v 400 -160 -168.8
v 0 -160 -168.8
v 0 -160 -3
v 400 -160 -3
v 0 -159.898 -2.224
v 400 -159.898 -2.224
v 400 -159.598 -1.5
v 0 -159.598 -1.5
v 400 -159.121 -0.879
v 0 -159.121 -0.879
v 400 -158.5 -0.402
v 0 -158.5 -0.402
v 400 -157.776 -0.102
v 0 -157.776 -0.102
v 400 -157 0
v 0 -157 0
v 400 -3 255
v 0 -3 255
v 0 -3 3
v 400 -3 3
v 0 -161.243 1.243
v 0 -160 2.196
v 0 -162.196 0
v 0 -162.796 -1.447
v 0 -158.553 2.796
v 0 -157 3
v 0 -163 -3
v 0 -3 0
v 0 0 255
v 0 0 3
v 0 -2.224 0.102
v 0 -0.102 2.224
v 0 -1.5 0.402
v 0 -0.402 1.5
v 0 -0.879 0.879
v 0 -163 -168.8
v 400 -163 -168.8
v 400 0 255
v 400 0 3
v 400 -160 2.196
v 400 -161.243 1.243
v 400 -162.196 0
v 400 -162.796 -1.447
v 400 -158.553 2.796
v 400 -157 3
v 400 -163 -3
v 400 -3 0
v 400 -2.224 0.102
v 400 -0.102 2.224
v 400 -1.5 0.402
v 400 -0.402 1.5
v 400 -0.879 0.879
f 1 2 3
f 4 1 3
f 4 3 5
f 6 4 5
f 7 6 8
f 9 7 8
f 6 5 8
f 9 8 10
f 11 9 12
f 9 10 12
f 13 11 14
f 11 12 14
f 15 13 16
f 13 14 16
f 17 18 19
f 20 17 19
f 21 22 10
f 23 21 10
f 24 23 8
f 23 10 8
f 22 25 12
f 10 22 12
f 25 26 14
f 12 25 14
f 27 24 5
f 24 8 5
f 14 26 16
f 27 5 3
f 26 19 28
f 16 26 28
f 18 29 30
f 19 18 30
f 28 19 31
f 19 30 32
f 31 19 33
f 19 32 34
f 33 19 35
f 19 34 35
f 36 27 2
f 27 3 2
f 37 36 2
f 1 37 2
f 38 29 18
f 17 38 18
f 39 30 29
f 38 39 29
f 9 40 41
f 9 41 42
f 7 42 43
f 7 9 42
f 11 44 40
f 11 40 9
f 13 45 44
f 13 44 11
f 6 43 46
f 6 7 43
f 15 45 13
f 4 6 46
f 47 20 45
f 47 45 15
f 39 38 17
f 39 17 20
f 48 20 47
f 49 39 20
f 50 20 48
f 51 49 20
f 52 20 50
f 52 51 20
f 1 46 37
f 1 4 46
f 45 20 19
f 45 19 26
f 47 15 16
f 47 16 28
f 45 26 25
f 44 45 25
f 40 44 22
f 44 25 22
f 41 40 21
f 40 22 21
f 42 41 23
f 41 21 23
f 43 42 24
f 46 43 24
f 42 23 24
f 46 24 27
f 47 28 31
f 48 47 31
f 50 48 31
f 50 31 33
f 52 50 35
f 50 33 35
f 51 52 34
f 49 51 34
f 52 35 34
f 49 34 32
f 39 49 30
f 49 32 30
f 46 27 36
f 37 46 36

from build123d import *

# Parameters (mm, degrees)
SALIENTE_EXTRUIR1_DEPTH = 400


with BuildPart() as part:
    # Croquis1 → Saliente-Extruir1 (new body)
    with BuildSketch(Plane(origin=(0, 0, 0), x_dir=(0, 0, -1), z_dir=(1, 0, 0))):
        with BuildLine():
            Line((-3, 0), (-255, 0))
            Line((-255, 0), (-255, -3))
            Line((-255, -3), (-3, -3))
            Line((-3, -3), (-3, -157))
            ThreePointArc((-3, -157), (-1.242640687, -161.242640687), (3, -163))
            Line((3, -163), (168.8, -163))
            Line((168.8, -163), (168.8, -160))
            Line((168.8, -160), (3, -160))
            ThreePointArc((3, -160), (0.878679656, -159.121320344), (0, -157))
            Line((0, -157), (0, -3))
            ThreePointArc((0, -3), (-0.878679656, -0.878679656), (-3, 0))
        make_face()
    extrude(amount=SALIENTE_EXTRUIR1_DEPTH)


solid = part.part
